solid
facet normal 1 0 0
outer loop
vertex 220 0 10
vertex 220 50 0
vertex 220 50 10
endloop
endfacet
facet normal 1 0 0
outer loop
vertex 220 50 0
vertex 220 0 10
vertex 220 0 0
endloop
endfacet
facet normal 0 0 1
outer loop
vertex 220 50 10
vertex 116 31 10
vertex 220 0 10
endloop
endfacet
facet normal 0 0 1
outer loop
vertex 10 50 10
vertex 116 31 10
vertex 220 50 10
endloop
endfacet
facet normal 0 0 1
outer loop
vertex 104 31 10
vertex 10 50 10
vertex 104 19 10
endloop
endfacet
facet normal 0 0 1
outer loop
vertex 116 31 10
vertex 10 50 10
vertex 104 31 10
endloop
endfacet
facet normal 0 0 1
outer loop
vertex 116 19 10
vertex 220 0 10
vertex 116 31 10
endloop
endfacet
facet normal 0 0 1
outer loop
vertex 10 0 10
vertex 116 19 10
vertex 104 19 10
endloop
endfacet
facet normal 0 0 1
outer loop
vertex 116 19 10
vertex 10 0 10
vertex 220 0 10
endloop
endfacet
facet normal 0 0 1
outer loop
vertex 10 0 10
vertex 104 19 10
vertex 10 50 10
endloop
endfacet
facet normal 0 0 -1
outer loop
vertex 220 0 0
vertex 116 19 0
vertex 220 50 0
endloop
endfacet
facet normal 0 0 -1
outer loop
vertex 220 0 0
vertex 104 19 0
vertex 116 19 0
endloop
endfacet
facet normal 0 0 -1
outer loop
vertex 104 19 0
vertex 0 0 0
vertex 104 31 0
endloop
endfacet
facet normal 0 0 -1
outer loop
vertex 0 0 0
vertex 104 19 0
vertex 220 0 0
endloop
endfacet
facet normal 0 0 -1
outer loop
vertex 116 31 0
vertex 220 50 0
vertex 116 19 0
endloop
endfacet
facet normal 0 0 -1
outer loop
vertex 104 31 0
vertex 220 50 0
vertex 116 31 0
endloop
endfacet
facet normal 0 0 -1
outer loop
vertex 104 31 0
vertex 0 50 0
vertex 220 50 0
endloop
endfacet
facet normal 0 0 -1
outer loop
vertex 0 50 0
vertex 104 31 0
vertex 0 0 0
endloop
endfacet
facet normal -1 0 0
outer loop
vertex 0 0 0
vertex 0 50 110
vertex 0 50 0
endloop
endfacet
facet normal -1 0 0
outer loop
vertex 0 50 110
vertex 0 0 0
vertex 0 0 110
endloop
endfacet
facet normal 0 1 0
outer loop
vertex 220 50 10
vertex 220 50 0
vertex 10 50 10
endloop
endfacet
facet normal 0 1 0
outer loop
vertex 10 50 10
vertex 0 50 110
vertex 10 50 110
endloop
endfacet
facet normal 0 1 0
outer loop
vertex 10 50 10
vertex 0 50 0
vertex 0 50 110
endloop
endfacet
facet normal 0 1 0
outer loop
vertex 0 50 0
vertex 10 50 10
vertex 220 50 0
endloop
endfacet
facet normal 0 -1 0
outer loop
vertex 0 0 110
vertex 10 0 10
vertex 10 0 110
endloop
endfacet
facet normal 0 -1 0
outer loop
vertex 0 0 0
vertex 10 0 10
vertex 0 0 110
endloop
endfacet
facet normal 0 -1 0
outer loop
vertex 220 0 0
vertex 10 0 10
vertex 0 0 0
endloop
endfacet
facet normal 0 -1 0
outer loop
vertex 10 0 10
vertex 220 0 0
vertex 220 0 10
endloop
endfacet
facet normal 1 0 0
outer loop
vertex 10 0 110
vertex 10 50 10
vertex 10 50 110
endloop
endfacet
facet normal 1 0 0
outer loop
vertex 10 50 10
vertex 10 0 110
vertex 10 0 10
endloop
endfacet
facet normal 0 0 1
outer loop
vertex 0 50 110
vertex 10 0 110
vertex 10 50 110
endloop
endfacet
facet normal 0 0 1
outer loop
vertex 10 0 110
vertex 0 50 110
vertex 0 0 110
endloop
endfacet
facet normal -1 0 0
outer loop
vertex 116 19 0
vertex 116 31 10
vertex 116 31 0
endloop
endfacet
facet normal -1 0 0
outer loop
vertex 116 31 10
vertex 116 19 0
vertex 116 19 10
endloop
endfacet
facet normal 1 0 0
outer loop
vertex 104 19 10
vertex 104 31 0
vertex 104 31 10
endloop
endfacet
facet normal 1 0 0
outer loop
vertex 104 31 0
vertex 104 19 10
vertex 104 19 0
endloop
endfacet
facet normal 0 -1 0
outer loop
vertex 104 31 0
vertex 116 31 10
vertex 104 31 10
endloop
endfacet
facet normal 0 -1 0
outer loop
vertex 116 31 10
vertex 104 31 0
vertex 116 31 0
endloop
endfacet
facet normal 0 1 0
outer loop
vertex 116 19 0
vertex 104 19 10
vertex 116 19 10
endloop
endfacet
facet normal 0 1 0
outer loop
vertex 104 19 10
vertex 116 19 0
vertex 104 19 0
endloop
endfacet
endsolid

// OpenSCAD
$fn = 32;

// ----------------------------------------------------------------------
// Gantry bracket: 200-250 mm L bracket
// ----------------------------------------------------------------------

// --- parameters (mm) ---
base_l = 220;             // base arm length, X
arm_w = 50;               // arm width, Y
thick = 10;               // arm thickness
up_h = 100;               // vertical arm height, Z
slot_w = 12;              // adjustment slot width in the base
fit_tol = 0.02;           // tolerance for press fits, mm
free_tol = 0.2;           // tolerance for clearance fits, mm

total_h = up_h + thick;  // overall height

difference() {
  union() {
    cube([base_l, arm_w, thick]);
    cube([thick, arm_w, total_h]);
  }
  translate([base_l / 2 - slot_w / 2, arm_w / 2 - slot_w / 2, -1])
    cube([slot_w, slot_w, thick + 2]);
}
